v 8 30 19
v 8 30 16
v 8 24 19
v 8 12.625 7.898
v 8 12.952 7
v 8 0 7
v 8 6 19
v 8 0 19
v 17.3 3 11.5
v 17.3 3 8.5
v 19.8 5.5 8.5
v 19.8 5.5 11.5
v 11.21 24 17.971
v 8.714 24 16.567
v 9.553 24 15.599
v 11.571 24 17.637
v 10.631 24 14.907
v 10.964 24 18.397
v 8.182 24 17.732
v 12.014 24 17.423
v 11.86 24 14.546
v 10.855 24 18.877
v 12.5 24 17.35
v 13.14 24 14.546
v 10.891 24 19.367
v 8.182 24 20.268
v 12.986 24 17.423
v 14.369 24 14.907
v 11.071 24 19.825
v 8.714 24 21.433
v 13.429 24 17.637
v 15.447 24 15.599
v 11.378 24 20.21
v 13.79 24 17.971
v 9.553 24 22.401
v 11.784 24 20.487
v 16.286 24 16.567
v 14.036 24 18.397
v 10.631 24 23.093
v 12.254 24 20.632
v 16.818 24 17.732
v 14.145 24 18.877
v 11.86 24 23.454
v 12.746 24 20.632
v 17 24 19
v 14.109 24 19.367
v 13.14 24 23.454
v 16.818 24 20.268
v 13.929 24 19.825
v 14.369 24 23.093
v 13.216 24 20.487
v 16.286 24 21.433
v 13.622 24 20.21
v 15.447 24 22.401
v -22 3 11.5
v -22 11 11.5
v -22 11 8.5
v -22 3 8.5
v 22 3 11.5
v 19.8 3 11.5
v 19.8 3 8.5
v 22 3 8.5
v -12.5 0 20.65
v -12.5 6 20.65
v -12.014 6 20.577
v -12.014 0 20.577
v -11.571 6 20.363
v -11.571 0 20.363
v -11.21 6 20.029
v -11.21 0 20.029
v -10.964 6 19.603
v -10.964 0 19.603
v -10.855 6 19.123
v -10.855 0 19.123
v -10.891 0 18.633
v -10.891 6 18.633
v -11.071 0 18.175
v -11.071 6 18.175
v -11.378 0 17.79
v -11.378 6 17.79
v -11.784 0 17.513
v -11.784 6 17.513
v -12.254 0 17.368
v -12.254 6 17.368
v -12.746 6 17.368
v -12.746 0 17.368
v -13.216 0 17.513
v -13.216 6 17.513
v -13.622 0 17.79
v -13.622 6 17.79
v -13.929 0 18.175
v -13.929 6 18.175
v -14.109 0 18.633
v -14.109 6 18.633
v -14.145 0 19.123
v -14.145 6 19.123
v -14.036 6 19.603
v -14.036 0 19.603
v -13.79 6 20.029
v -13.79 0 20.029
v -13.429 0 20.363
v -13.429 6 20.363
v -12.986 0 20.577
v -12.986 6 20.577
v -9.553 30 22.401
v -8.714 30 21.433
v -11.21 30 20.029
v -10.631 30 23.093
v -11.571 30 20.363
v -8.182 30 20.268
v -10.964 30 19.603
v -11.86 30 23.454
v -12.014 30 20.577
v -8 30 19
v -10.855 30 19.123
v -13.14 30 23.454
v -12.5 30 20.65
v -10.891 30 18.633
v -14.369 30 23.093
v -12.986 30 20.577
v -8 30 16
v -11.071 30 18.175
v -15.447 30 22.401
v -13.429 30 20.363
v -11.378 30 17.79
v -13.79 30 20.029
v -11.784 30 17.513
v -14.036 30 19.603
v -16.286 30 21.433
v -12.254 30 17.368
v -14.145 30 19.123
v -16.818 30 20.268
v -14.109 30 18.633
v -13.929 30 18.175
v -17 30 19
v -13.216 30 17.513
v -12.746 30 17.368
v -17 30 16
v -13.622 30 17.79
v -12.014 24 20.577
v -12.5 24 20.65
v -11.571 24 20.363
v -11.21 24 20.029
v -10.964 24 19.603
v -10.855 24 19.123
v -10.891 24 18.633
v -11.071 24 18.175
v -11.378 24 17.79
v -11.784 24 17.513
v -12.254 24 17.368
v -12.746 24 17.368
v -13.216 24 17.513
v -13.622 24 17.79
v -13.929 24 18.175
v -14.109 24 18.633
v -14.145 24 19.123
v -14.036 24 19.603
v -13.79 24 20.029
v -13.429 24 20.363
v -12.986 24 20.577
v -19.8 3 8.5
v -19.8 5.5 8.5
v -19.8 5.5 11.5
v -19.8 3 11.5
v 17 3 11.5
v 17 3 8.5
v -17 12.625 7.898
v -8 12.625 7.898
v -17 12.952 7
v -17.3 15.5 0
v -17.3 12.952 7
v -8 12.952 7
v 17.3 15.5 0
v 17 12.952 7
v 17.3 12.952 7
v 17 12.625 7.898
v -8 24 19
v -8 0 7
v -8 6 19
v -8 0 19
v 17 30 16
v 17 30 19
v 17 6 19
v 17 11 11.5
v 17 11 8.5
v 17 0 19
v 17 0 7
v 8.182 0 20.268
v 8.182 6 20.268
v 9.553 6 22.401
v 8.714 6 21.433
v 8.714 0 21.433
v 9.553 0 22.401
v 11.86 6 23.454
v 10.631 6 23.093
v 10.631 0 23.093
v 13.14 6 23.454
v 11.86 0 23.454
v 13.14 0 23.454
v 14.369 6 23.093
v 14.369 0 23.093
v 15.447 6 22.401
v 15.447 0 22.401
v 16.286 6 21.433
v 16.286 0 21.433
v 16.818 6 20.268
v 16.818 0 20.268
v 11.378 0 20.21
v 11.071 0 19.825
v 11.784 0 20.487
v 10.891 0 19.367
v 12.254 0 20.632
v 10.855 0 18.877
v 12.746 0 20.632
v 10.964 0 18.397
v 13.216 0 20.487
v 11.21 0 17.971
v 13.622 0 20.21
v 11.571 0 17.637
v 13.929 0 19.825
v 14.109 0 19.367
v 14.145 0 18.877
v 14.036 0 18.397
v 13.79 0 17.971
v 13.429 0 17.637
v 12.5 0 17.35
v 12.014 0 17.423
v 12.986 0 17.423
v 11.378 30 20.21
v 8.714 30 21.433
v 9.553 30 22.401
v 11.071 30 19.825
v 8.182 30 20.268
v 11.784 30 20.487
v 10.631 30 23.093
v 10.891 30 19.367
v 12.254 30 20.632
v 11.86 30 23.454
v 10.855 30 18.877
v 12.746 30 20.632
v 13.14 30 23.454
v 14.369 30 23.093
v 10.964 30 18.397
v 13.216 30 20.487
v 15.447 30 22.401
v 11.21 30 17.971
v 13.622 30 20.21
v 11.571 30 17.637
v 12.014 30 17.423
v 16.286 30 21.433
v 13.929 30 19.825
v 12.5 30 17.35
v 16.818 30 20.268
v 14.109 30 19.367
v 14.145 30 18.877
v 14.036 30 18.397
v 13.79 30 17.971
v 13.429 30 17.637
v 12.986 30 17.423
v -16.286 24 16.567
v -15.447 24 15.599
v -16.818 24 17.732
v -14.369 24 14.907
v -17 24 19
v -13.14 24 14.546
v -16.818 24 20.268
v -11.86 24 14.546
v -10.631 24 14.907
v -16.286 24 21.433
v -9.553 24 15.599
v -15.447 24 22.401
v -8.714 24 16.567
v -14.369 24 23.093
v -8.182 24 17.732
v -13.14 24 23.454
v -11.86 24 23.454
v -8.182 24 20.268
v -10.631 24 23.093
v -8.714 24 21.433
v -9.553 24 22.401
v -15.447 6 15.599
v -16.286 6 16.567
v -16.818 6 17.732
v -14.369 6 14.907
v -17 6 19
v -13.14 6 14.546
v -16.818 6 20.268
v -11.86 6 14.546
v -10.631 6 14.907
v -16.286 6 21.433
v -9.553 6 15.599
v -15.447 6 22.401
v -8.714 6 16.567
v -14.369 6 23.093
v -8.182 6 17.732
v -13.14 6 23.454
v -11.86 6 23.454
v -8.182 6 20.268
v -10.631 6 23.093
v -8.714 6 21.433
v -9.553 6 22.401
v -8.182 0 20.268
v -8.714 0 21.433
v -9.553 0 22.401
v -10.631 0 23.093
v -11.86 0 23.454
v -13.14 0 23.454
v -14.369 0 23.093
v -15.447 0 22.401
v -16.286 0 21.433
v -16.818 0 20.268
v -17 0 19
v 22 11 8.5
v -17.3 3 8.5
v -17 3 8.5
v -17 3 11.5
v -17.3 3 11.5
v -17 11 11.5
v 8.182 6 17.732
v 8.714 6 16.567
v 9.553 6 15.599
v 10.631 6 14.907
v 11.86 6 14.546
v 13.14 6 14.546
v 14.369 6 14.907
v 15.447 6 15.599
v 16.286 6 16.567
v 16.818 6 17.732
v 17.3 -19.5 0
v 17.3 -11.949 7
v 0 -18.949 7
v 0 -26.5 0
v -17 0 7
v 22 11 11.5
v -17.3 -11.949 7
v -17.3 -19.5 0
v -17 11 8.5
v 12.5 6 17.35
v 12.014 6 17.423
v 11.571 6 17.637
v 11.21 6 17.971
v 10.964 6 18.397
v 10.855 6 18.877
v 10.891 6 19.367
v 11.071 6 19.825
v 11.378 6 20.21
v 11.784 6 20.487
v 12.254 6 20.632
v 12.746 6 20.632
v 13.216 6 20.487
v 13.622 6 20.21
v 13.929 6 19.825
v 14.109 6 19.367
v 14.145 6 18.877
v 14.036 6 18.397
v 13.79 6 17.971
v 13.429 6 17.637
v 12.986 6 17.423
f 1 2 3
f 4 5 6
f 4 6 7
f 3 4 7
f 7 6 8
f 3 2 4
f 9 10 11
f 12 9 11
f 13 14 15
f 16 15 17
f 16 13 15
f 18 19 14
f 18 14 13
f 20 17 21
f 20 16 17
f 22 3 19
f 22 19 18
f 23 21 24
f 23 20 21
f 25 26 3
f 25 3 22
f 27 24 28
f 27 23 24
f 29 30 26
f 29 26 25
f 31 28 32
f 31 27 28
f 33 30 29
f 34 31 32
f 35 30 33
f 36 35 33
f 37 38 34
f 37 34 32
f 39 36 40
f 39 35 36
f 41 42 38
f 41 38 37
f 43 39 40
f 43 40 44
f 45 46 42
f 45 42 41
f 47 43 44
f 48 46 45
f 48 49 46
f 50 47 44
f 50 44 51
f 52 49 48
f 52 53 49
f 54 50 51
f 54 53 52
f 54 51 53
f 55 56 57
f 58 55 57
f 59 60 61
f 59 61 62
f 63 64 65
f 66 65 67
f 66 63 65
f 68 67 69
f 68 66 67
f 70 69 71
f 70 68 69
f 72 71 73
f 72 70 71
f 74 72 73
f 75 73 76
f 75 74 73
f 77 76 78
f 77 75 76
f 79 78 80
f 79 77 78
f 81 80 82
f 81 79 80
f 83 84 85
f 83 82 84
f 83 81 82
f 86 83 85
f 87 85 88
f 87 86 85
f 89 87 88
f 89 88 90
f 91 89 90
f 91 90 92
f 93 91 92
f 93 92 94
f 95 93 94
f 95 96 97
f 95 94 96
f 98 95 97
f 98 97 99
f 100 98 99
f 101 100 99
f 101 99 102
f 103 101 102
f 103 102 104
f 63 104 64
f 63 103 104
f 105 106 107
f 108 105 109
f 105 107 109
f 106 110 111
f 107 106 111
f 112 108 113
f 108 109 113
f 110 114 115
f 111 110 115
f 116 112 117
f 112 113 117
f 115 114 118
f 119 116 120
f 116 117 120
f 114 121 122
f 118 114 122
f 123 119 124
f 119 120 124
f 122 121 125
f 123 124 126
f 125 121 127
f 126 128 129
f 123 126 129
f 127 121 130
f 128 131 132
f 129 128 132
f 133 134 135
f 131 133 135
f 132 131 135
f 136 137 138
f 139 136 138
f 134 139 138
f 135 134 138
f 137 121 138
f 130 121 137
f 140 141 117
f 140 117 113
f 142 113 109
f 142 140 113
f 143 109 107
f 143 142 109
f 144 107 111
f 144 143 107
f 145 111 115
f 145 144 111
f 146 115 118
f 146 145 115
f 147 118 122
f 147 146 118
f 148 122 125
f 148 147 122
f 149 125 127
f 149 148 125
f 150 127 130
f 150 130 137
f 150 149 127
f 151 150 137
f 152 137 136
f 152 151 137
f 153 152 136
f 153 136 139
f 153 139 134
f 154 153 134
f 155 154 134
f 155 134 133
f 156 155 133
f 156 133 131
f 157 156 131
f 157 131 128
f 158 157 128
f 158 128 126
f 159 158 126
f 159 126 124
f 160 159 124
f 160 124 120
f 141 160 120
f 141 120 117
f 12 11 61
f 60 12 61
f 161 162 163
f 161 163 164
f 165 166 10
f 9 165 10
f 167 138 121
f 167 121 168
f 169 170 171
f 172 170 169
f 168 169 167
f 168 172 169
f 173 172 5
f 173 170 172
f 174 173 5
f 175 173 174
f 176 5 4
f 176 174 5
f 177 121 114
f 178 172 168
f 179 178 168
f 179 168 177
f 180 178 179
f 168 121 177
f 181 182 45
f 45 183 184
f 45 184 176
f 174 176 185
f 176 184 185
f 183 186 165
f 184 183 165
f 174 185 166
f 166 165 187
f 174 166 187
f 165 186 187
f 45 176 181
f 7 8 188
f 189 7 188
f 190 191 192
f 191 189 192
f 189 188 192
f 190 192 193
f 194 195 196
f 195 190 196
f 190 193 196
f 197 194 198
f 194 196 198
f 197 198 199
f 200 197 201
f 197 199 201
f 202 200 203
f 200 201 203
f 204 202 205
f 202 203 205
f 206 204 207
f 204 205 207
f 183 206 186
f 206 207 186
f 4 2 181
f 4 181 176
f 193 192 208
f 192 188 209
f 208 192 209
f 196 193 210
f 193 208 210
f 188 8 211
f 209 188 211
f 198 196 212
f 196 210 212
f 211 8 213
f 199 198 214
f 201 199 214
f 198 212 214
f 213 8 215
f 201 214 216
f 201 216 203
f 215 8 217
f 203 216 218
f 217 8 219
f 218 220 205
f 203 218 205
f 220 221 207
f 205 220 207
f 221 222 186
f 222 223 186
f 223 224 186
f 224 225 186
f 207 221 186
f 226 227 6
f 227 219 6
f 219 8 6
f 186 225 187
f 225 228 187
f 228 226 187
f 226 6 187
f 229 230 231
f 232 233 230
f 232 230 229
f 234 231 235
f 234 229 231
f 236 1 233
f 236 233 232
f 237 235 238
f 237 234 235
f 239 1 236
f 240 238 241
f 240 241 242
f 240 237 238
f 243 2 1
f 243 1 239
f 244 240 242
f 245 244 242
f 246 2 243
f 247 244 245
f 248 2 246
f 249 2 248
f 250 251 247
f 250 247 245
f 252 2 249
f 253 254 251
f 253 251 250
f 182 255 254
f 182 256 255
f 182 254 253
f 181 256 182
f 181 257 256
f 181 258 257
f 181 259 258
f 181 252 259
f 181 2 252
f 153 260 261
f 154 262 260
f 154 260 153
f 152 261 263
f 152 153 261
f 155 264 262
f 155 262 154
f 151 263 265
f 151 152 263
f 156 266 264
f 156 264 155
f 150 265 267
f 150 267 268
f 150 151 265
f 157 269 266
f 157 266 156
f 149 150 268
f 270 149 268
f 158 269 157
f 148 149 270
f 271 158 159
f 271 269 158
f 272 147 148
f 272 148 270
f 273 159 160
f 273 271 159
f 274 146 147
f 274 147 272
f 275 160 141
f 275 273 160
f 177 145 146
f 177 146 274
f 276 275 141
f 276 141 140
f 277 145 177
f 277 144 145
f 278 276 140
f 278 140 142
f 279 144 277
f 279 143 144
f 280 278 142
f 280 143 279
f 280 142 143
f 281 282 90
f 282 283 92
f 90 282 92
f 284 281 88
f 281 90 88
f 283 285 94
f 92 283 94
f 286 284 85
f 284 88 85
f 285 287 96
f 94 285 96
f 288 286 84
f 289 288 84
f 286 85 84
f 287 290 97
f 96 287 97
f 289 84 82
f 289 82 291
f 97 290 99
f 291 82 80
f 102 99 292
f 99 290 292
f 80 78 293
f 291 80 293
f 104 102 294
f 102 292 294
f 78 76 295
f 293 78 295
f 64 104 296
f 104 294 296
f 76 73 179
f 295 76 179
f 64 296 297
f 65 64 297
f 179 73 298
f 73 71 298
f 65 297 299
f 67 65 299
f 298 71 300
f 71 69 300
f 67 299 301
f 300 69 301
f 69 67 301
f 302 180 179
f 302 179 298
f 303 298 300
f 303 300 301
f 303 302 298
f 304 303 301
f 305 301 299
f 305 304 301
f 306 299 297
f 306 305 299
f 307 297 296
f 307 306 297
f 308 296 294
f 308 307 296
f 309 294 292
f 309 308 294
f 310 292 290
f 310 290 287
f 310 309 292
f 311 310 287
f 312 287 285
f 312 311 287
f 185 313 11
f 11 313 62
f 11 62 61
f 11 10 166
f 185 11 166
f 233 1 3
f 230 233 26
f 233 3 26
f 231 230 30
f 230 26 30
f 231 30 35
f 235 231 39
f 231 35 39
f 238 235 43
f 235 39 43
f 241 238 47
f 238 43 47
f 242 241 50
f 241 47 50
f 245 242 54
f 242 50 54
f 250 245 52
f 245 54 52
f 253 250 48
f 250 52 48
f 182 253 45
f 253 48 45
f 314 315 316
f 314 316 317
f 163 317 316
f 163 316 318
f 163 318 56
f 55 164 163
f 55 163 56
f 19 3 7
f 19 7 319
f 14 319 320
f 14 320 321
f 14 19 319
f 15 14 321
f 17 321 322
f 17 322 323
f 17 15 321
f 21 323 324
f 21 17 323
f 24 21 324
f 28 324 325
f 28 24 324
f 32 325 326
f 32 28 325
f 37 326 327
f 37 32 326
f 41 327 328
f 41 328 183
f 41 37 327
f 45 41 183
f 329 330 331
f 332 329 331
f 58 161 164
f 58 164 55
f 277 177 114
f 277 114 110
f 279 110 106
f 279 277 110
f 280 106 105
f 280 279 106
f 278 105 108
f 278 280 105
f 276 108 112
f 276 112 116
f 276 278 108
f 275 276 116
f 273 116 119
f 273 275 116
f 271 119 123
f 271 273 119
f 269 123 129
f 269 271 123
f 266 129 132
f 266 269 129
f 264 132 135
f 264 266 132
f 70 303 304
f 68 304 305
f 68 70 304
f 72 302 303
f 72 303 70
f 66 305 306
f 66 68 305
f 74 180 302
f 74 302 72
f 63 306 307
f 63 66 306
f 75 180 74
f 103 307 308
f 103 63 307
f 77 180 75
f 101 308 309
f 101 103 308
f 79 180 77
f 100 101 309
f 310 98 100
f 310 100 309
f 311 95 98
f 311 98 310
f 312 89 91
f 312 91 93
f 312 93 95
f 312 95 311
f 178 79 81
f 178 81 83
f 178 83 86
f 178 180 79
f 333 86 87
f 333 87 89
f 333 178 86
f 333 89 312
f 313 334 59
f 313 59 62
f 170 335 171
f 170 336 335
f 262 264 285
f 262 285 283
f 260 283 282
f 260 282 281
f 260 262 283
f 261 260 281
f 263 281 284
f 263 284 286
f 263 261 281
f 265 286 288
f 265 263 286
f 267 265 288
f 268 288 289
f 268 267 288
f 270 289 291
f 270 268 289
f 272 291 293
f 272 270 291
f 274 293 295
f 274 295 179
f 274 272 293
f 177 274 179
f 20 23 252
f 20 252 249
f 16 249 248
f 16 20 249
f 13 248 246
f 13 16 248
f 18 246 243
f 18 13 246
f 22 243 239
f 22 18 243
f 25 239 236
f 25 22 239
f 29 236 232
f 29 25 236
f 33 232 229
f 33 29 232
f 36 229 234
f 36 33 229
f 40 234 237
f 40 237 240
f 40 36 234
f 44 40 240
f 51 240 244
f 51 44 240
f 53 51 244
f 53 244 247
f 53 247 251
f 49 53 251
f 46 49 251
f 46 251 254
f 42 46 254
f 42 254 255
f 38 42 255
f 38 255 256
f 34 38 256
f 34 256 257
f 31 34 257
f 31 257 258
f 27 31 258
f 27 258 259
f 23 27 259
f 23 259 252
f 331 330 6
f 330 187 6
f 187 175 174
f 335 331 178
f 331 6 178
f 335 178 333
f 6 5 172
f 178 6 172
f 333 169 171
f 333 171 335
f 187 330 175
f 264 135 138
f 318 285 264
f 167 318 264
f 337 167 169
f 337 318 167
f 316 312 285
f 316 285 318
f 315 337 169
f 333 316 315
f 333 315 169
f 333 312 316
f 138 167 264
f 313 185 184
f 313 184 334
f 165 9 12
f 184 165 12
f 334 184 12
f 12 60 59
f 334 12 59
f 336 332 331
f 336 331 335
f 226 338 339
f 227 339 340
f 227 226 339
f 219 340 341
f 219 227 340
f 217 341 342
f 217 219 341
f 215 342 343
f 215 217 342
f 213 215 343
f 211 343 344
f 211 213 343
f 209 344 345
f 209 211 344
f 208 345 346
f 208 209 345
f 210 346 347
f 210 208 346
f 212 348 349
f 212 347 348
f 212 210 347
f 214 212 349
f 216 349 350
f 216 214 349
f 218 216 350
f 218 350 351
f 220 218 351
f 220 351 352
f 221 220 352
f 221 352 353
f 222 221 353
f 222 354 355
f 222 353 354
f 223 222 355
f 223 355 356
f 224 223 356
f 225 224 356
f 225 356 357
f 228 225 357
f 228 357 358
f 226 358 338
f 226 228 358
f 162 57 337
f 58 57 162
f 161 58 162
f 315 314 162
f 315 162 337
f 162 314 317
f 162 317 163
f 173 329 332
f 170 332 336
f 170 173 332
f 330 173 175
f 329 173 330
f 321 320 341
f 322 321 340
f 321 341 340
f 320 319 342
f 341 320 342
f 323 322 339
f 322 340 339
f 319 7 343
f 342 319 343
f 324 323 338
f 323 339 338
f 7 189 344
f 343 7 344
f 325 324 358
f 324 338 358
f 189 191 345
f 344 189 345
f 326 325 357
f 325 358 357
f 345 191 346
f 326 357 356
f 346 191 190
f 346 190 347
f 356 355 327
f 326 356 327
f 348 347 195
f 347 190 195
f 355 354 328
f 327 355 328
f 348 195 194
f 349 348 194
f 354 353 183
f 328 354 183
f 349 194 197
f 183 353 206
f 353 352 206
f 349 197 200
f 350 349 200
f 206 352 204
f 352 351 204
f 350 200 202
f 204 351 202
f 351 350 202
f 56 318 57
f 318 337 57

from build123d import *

# Parameters (mm, degrees)
ESBO_O1_W                  = 34.6
ESBO_O1_H                  = 26
RESSALTO_EXTRUS_O1_DEPTH   = 7
ESBO_O10_W                 = 34.6
ESBO_O10_H                 = 2.5
RESSALTO_EXTRUS_O4_DEPTH   = 7
CHANFRO1_SIZE              = 7
CHANFRO2_SIZE2             = 7
CHANFRO2_SIZE              = 2.54779164
ESBO_O12_R                 = 1.65
RESSALTO_EXTRUS_O5_DEPTH   = 30
RESSALTO_EXTRUS_O6_START   = 3
RESSALTO_EXTRUS_O6_DEPTH   = 8
CORTE_EXTRUS_O2_DEPTH      = 40.089640571
CORTE_EXTRUS_O2_DEPTH_BACK = 40.089640571
CHANFRO3_SIZE              = 9
CHANFRO3_SIZE_2            = 19.300562285
CORTE_EXTRUS_O3_START      = -24
ESBO_O17_R                 = 4.5
CORTE_EXTRUS_O3_DEPTH      = 18


# Some blends are built 0.0001 mm under size
with BuildPart() as part:
    # Esboço1 → Ressalto-extrusão1 (new body)
    with BuildSketch(Plane.XY):
        Rectangle(ESBO_O1_W, ESBO_O1_H)
    extrude(amount=RESSALTO_EXTRUS_O1_DEPTH)

    # Esboço10 → Ressalto-extrusão4 (add)
    with BuildSketch(Plane(origin=(0, 0, 0), x_dir=(-1, 0, 0), z_dir=(0, 0, -1))):
        Polygon((-17.3, -19.5), (0, -26.5), (17.3, -19.5), (17.3, -13), (-17.3, -13), align=None)
        with Locations((0, 14.25)):
            Rectangle(ESBO_O10_W, ESBO_O10_H)
    extrude(amount=-RESSALTO_EXTRUS_O4_DEPTH)

    # Chanfro1
    chanfro1_edges = [part.edges().sort_by_distance(p)[0] for p in [
        (8.65, -23, 7),
        (-8.65, -23, 7),
    ]]
    chamfer(chanfro1_edges, length=CHANFRO1_SIZE - 0.0001)  # a hair under: the kernel refuses the full size

    # Chanfro2
    chanfro2_edges = [part.edges().sort_by_distance(p)[0] for p in [
        (0, 15.5, 7),
    ]]
    chanfro2_side = [part.faces().sort_by_distance(p)[0] for p in [
        (0, 15.449044167, 7),
    ]]
    chamfer(chanfro2_edges, length=CHANFRO2_SIZE - 0.0001, length2=CHANFRO2_SIZE2 - 0.0001, reference=chanfro2_side[0])  # a hair under: the kernel refuses the full size

    # Esboço12 → Ressalto-extrusão5 (add)
    # profile 1 of 2: a face of its own
    with BuildSketch(Plane(origin=(0, 0, 0), x_dir=(1, 0, 0), z_dir=(0, 1, 0))):
        with BuildLine():
            Line((-17, -19), (-17, -7))
            Line((-17, -7), (-8, -7))
            Line((-8, -7), (-8, -19))
            ThreePointArc((-8, -19), (-12.5, -23.5), (-17, -19))
        make_face()
        with Locations(Location((-12.5, -19, 0), (0, 0, 270))):
            Circle(ESBO_O12_R, mode=Mode.SUBTRACT)
    # profile 2 of 2: a face of its own
    with BuildSketch(Plane(origin=(0, 0, 0), x_dir=(1, 0, 0), z_dir=(0, 1, 0))):
        with BuildLine():
            Line((8, -7), (8, -19))
            ThreePointArc((8, -19), (12.5, -23.5), (17, -19))
            Line((17, -19), (17, -7))
            Line((17, -7), (8, -7))
        make_face()
        with Locations(Location((12.5, -19, 0), (0, 0, 90))):
            Circle(ESBO_O12_R, mode=Mode.SUBTRACT)
    extrude(amount=RESSALTO_EXTRUS_O5_DEPTH)

    # Esboço15 → Ressalto-extrusão6 (add)
    with BuildSketch(Plane(origin=(0, 0, 0), x_dir=(1, 0, 0), z_dir=(0, 1, 0)).offset(RESSALTO_EXTRUS_O6_START)):
        Polygon((-22, -11.5), (-22, -8.5), (-17, -8.5), (-17, -7), (-8, -7), (-8, -11.5), align=None)
        Polygon((17, -8.5), (17, -7), (8, -7), (8, -11.5), (22, -11.5), (22, -8.5), align=None)
    extrude(amount=RESSALTO_EXTRUS_O6_DEPTH)

    # Esboço16 → Corte-extrusão2 (cut, two sides: drawn at the far end of the back side and taken through both)
    with BuildSketch(Plane.XY.offset(11.5).offset(-CORTE_EXTRUS_O2_DEPTH_BACK)):
        Polygon((-17.3, 3), (-19.8, 5.5), (-19.8, 3), align=None)
        Polygon((19.8, 3), (17.3, 3), (19.8, 5.5), align=None)
    extrude(amount=CORTE_EXTRUS_O2_DEPTH + CORTE_EXTRUS_O2_DEPTH_BACK, mode=Mode.SUBTRACT)

    # Chanfro3
    # the kernel refuses this chamfer: 19.300562285, 9 mm, written as the material it takes off along each edge
    with BuildSketch(Plane(origin=(-67.007283464, 30, 7), x_dir=(0, 0.07481330637060048, 0.9971975577536772), z_dir=(1, 0, 0))) as chanfro3_piece_1_section:
        Polygon((CHANFRO3_SIZE * 0.997197557754, CHANFRO3_SIZE * 0.0748133063706), (-CHANFRO3_SIZE_2 * 0.074813306369, CHANFRO3_SIZE_2 * 0.997197557732), (0, 0), align=None)
    chanfro3_piece_1 = extrude(amount=109.014566928, mode=Mode.PRIVATE)
    chanfro3_piece_1 = split(chanfro3_piece_1, bisect_by=Plane(origin=(-12.5, 13.283132455, 6.091045576), z_dir=(0, 0.9396953649145792, 0.34201260380000037)), keep=Keep.TOP, mode=Mode.PRIVATE)
    add(chanfro3_piece_1, mode=Mode.SUBTRACT)
    with BuildSketch(Plane(origin=(67.007283464, 30, 7), x_dir=(0, -0.9998669641130703, -0.01631116413111024), z_dir=(-1, 0, 0))) as chanfro3_piece_2_section:
        Polygon((CHANFRO3_SIZE_2 * 0.999866964092, CHANFRO3_SIZE_2 * 0.0163111641308), (-CHANFRO3_SIZE * 0.0163111641311, CHANFRO3_SIZE * 0.999866964113), (0, 0), align=None)
    chanfro3_piece_2 = extrude(amount=109.014566928, mode=Mode.PRIVATE)
    chanfro3_piece_2 = split(chanfro3_piece_2, bisect_by=Plane(origin=(12.5, 13.283132455, 6.091045576), z_dir=(0, 0.9396953649145792, 0.34201260380000037)), keep=Keep.TOP, mode=Mode.PRIVATE)
    add(chanfro3_piece_2, mode=Mode.SUBTRACT)

    # Esboço17 → Corte-extrusão3 (cut)
    with BuildSketch(Plane.XZ.offset(CORTE_EXTRUS_O3_START)):
        with Locations((-12.5, 19)):
            Circle(ESBO_O17_R)
        with Locations((12.5, 19)):
            Circle(ESBO_O17_R)
    extrude(amount=CORTE_EXTRUS_O3_DEPTH, mode=Mode.SUBTRACT)


solid = part.part
